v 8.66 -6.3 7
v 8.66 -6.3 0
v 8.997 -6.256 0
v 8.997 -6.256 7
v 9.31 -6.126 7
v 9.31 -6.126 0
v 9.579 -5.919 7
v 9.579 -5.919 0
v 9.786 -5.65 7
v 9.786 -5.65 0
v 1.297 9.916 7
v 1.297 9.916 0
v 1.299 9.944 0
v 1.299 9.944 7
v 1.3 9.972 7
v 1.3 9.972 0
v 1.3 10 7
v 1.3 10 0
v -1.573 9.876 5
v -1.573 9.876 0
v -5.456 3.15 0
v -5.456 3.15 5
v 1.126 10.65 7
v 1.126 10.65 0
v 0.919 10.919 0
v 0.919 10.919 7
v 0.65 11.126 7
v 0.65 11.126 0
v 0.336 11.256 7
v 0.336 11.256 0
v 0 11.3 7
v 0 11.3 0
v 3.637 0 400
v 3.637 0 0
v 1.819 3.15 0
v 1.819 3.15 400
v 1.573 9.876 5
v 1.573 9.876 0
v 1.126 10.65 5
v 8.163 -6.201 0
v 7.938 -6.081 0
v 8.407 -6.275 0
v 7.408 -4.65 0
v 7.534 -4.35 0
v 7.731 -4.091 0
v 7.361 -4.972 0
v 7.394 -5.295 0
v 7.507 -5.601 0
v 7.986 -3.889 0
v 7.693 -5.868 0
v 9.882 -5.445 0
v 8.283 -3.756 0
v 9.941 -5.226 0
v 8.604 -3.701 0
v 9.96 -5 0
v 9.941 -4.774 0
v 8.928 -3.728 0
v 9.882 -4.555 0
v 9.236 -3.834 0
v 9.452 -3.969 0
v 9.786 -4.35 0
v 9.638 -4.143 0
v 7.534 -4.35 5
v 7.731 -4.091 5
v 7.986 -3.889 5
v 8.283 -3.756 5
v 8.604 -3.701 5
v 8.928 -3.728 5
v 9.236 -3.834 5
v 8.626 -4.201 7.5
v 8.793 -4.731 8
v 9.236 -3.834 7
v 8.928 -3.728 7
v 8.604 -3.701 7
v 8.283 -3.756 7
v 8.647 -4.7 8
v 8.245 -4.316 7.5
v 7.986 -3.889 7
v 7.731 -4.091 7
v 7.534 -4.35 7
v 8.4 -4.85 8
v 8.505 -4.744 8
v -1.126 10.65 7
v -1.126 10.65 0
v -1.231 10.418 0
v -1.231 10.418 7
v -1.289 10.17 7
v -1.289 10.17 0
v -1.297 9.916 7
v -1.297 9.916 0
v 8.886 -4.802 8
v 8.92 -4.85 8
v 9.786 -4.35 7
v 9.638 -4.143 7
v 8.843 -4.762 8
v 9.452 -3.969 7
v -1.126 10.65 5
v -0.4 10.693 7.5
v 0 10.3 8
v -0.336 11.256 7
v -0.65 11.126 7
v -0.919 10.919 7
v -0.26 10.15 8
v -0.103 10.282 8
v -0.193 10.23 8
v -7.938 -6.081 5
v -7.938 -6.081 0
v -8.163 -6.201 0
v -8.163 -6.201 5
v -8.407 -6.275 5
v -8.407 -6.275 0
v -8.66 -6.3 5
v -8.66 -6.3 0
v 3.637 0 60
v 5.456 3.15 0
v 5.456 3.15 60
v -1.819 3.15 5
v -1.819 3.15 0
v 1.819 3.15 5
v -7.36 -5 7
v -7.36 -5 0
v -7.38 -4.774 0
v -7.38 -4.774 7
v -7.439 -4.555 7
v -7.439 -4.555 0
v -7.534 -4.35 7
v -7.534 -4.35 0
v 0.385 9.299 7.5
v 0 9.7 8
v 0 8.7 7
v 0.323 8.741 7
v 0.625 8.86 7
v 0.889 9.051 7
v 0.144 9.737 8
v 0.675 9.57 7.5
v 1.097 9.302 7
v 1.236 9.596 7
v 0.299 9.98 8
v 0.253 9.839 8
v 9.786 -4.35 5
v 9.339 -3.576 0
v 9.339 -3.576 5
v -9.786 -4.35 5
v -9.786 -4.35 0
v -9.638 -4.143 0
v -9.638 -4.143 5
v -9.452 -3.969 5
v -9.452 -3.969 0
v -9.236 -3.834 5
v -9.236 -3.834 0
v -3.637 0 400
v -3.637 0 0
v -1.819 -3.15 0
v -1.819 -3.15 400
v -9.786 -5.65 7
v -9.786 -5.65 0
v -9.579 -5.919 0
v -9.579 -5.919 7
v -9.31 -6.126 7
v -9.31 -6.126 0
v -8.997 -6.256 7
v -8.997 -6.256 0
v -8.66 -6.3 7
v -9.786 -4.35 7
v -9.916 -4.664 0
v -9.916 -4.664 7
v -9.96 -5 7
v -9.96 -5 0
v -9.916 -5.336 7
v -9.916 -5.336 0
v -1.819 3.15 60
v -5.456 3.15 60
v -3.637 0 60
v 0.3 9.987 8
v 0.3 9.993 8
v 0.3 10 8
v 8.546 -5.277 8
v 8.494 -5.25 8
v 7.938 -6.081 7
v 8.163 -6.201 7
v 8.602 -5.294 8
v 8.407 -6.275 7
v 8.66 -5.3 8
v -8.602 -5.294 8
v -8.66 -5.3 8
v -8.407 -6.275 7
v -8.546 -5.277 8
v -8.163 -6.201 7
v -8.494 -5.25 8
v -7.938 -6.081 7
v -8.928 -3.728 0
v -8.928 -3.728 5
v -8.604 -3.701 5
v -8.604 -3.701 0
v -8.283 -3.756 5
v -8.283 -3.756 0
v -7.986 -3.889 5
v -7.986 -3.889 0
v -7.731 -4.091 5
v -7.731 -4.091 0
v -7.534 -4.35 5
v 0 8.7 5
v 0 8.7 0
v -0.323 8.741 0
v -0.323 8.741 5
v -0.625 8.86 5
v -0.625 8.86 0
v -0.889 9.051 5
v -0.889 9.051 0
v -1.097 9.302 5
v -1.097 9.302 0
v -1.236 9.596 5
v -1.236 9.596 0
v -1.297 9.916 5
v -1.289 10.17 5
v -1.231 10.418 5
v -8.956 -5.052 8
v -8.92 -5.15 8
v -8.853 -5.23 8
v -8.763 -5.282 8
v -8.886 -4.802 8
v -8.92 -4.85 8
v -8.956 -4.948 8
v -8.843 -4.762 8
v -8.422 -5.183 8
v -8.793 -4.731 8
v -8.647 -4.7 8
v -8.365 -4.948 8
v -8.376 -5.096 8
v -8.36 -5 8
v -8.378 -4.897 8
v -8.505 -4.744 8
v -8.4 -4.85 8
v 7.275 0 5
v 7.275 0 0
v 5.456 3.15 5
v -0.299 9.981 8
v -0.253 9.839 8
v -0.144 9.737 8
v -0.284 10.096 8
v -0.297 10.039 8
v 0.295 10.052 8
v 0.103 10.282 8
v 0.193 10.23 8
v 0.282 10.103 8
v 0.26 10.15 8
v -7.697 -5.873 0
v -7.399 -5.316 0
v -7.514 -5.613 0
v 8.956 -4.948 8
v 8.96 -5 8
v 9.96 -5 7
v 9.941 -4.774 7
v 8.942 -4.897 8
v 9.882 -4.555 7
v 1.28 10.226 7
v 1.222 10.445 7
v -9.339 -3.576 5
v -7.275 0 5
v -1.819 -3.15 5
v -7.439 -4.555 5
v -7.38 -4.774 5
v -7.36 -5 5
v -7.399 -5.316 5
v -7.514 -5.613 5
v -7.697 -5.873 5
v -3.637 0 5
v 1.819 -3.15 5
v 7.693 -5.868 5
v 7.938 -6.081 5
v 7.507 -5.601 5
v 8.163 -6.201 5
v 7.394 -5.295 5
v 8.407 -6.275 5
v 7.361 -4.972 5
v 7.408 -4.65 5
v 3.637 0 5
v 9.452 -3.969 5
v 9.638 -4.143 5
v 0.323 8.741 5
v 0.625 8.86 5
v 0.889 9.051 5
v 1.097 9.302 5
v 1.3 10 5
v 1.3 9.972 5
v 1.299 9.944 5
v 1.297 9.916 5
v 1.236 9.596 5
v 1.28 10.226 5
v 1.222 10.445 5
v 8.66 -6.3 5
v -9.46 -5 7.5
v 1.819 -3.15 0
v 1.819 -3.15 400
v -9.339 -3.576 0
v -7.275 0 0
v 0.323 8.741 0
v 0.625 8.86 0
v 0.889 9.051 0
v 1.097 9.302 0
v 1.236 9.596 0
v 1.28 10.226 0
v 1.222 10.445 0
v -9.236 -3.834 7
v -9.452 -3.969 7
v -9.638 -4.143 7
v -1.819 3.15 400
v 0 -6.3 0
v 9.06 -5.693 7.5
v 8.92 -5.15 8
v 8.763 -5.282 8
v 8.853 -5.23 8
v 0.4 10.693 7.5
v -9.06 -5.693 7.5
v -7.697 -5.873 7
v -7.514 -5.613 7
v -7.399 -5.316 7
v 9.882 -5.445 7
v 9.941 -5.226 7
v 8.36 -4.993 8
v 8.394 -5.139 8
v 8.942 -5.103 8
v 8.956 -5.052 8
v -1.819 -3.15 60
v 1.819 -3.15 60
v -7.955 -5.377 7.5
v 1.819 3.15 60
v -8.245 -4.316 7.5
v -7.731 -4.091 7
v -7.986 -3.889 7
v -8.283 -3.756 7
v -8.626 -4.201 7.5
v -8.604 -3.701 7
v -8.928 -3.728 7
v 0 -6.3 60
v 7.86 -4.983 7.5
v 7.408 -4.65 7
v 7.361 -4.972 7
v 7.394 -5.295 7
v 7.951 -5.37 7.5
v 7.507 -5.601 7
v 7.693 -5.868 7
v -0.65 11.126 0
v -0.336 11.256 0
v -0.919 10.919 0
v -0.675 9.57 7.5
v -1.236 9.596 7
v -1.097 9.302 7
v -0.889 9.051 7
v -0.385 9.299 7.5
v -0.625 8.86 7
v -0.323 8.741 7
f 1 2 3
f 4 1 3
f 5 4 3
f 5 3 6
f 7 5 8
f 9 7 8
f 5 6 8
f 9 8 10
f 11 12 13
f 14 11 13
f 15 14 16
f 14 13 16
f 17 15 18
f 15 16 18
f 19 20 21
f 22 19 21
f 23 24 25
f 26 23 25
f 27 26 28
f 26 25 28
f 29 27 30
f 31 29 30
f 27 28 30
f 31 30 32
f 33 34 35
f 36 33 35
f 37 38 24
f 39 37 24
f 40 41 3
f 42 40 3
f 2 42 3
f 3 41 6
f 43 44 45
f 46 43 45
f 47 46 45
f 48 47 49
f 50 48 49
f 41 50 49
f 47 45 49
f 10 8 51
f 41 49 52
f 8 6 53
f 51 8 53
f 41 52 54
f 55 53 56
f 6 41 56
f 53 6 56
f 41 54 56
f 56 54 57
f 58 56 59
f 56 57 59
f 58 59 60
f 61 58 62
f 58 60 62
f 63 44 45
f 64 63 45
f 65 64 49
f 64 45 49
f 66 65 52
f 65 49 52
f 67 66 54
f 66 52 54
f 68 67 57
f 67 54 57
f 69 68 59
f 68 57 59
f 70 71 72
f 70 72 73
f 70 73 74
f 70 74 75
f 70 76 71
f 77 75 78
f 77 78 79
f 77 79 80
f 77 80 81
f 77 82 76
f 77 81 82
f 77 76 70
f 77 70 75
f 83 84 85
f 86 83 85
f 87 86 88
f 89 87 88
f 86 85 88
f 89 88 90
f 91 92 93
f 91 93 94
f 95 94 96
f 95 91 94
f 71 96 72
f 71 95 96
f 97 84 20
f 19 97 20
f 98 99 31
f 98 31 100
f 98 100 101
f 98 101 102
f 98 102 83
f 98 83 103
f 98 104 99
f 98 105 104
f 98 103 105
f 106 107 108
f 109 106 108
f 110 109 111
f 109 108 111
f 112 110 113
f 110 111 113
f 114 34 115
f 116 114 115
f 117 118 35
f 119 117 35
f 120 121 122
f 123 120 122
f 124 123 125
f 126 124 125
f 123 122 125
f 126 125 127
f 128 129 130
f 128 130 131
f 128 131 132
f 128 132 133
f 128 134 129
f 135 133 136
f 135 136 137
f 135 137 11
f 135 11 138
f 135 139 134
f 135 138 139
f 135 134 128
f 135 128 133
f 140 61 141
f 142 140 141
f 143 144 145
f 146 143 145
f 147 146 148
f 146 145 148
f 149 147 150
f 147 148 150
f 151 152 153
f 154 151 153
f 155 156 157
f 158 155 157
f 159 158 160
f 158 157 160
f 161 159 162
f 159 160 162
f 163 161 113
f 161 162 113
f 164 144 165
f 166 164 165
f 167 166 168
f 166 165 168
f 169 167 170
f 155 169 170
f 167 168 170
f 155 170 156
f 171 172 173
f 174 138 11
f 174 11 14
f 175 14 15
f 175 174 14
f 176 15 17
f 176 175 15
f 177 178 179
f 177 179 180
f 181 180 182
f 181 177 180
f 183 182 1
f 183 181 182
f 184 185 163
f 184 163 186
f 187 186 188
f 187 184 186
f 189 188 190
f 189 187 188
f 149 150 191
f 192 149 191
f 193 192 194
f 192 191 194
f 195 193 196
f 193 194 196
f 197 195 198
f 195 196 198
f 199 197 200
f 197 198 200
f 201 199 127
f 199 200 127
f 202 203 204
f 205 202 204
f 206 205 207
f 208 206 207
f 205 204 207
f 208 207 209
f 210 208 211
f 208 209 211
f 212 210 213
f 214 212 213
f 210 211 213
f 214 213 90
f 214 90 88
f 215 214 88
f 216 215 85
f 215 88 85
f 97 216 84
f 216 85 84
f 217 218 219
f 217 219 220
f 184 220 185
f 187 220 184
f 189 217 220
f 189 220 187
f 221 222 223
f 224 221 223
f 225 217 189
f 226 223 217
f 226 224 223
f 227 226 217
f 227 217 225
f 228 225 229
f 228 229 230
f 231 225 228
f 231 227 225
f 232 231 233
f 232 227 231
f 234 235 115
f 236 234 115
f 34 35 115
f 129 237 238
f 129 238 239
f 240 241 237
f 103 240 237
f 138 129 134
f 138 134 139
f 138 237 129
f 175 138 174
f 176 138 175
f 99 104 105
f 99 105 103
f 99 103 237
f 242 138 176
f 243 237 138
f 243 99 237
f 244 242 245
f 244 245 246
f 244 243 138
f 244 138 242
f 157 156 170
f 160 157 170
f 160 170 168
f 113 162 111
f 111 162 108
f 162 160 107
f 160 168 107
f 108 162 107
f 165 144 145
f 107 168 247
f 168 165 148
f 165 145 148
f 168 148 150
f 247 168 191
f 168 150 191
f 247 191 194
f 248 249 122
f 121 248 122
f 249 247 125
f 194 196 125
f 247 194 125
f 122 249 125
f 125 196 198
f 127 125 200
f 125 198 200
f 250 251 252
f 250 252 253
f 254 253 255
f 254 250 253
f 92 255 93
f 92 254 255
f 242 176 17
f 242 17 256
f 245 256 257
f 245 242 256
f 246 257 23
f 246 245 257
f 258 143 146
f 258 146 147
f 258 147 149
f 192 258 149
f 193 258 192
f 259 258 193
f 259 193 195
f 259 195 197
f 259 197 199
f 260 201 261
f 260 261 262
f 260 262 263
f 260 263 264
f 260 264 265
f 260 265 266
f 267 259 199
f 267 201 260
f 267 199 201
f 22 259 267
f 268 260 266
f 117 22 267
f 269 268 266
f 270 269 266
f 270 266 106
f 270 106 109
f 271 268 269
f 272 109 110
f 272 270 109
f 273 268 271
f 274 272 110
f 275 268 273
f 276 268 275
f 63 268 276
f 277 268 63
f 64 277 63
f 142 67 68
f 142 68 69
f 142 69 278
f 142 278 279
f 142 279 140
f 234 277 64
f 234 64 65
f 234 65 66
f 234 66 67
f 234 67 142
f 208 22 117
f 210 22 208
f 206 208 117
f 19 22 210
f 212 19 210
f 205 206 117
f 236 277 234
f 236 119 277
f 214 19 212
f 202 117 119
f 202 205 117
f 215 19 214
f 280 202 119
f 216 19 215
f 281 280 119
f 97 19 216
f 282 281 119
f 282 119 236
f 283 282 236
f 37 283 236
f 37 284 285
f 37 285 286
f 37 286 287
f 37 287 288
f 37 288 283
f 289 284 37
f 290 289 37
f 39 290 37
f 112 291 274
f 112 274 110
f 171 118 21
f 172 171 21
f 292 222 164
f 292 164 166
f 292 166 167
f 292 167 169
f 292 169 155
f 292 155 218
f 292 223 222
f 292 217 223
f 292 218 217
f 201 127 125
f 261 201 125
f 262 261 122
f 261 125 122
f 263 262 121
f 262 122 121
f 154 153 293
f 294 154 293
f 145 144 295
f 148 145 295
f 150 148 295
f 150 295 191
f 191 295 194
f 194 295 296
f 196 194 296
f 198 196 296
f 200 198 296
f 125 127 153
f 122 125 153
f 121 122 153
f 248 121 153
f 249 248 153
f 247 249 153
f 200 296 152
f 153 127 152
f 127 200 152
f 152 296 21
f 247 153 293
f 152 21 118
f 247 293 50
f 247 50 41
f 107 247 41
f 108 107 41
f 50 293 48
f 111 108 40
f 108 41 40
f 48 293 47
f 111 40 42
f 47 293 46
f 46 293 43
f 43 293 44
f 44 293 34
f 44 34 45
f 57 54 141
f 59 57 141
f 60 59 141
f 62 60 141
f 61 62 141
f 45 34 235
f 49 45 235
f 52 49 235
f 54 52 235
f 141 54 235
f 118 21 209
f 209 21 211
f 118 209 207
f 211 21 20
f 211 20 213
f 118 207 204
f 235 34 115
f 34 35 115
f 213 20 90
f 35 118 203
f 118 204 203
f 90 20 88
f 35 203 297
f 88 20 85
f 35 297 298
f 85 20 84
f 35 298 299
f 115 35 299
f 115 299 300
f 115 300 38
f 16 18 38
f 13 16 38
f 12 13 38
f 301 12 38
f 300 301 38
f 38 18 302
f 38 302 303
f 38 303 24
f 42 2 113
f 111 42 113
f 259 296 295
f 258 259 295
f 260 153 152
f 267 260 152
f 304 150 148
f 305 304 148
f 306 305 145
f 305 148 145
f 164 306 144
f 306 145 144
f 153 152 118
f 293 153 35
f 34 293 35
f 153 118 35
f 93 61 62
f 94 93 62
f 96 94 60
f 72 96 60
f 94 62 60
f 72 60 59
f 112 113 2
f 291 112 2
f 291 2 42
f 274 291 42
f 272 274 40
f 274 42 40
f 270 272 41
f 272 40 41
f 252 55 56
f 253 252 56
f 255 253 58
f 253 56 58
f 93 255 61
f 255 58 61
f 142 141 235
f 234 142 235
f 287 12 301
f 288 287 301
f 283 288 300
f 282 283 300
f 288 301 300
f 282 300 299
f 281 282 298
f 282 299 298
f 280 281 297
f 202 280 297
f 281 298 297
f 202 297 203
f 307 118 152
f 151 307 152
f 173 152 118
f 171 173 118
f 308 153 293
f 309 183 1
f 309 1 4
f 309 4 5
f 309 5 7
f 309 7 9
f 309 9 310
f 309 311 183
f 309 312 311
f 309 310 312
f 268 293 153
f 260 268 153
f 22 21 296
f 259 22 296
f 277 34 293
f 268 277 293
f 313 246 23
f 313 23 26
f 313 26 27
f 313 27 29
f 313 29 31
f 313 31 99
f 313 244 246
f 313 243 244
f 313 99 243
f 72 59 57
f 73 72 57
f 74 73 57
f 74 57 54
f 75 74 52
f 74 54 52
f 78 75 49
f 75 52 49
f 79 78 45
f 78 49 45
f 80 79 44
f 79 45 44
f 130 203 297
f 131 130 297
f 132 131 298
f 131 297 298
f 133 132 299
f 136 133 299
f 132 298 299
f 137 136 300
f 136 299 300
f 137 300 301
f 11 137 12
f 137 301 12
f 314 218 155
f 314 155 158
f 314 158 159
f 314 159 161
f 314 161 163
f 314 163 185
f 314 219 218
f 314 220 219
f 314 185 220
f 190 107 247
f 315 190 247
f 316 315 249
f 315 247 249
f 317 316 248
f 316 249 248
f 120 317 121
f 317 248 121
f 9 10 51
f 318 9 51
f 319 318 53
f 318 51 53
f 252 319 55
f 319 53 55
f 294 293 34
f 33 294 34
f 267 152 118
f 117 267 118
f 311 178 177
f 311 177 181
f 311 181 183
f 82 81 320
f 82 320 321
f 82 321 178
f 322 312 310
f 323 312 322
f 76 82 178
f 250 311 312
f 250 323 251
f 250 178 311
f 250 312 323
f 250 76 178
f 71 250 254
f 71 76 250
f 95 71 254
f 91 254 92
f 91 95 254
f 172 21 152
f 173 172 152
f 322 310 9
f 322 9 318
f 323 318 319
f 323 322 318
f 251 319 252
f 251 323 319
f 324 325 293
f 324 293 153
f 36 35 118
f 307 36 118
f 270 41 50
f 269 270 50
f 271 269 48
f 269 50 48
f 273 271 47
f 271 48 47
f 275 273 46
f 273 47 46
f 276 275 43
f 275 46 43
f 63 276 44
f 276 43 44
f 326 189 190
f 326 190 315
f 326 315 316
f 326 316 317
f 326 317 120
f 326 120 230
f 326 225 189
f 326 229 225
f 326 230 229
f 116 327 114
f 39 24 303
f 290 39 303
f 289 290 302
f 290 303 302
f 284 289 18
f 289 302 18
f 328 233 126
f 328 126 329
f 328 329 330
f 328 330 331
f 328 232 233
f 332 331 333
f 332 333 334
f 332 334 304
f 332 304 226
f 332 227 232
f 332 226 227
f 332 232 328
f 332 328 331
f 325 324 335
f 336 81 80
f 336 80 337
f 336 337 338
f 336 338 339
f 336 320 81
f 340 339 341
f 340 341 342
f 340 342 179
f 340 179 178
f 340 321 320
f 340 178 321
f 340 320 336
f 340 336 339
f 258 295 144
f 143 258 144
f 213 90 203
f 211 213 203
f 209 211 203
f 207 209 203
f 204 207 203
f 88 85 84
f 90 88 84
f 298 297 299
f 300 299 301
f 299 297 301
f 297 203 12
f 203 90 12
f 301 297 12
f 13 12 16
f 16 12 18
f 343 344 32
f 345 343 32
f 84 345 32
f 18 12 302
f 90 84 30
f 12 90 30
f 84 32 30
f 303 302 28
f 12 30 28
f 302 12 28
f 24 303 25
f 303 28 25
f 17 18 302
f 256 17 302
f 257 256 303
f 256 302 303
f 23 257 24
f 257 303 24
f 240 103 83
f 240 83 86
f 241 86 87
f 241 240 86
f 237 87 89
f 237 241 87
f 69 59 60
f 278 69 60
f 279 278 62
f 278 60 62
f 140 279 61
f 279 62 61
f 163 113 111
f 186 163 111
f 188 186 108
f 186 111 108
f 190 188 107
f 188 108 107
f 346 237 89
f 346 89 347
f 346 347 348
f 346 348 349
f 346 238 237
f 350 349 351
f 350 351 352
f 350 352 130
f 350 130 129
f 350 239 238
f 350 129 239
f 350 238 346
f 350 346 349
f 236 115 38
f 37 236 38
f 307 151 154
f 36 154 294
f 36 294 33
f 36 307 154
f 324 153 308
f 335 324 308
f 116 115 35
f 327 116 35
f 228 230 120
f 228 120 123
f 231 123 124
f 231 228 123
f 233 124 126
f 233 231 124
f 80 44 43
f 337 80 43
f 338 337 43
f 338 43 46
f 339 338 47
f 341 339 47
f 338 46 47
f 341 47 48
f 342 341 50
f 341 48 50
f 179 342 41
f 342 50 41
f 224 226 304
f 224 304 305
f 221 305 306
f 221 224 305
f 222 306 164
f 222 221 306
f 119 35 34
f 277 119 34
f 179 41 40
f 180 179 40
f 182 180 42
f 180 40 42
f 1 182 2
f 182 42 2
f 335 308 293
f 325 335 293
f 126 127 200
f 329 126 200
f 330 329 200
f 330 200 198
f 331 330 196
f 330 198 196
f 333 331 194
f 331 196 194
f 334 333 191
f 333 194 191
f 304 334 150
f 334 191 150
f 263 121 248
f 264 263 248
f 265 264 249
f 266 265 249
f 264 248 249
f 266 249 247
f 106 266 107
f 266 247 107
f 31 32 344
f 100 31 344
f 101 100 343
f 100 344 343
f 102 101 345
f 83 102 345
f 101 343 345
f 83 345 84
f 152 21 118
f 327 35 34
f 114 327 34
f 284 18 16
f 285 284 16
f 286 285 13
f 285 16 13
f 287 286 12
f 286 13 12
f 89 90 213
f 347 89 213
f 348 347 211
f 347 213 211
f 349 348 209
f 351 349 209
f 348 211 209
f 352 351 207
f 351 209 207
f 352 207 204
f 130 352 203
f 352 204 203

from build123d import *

# Parameters (mm, degrees)
F1_DEPTH  = 5
F2_DEPTH  = 60
F3_DEPTH  = 400
F4_DEPTH  = 8
F5_SIZE   = 1
F5_2_SIZE = 1
F5_3_SIZE = 1


with BuildPart() as f1:
    # F0 (on Top) → F1 (new body)
    with BuildSketch(Plane.XY):
        with BuildLine():
            ThreePointArc((-1.2972508431, 9.9155), (-1.435256889, 9.8964659178), (-1.5729843808, 9.875511133))
            Line((-1.5729843808, 9.875511133), (-5.4559600438, 3.15))
            Line((-5.4559600438, 3.15), (-1.8186533479, 3.15))
            Line((-1.8186533479, 3.15), (0, 6.3))
            Line((0, 6.3), (0, 8.7))
            ThreePointArc((0, 8.7), (-0.8888616315, 9.0513562312), (-1.2972508431, 9.9155))
        make_face()
        with BuildLine():
            ThreePointArc((1.2972508431, 9.9155), (0.8888616315, 9.0513562312), (0, 8.7))
            Line((0, 8.7), (0, 6.3))
            Line((0, 6.3), (1.8186533479, 3.15))
            Line((1.8186533479, 3.15), (5.4559600438, 3.15))
            Line((5.4559600438, 3.15), (1.5729843808, 9.875511133))
            ThreePointArc((1.5729843808, 9.875511133), (1.435256889, 9.8964659178), (1.2972508431, 9.9155))
        make_face()
        Polygon((-5.4559600438, 3.15), (-7.2746133918, 0), (-3.6373066959, 0), align=None)
        with BuildLine():
            Line((-3.6373066959, 0), (-7.2746133918, 0))
            Line((-7.2746133918, 0), (-9.3389357069, -3.575511133))
            ThreePointArc((-9.3389357069, -3.575511133), (-9.288219337, -3.7052640321), (-9.2357003128, -3.8342978148))
            ThreePointArc((-9.2357003128, -3.8342978148), (-8.2831352507, -3.7559013623), (-7.5344210129, -4.35))
            Line((-7.5344210129, -4.35), (-5.4559600438, -3.15))
            Line((-5.4559600438, -3.15), (-3.6373066959, 0))
        make_face()
        with BuildLine():
            Line((-1.8186533479, -3.15), (-5.4559600438, -3.15))
            Line((-5.4559600438, -3.15), (-7.5344210129, -4.35))
            ThreePointArc((-7.5344210129, -4.35), (-7.4045504637, -4.6635352414), (-7.3602540378, -5))
            ThreePointArc((-7.3602540378, -5), (-7.513880203, -5.6130473315), (-7.9384494697, -6.0812021852))
            ThreePointArc((-7.9384494697, -6.0812021852), (-7.852962448, -6.1912018858), (-7.7659513261, -6.3))
            Line((-7.7659513261, -6.3), (0, -6.3))
            Line((0, -6.3), (-1.8186533479, -3.15))
        make_face()
        with BuildLine():
            Line((1.8186533479, -3.15), (0, -6.3))
            Line((0, -6.3), (7.7659513261, -6.3))
            ThreePointArc((7.7659513261, -6.3), (7.852962448, -6.1912018858), (7.9384494697, -6.0812021852))
            ThreePointArc((7.9384494697, -6.0812021852), (7.3942736192, -5.295454869), (7.5344210129, -4.35))
            Line((7.5344210129, -4.35), (5.4559600438, -3.15))
            Line((5.4559600438, -3.15), (1.8186533479, -3.15))
        make_face()
        with BuildLine():
            Line((3.6373066959, 0), (5.4559600438, -3.15))
            Line((5.4559600438, -3.15), (7.5344210129, -4.35))
            ThreePointArc((7.5344210129, -4.35), (8.2831352507, -3.7559013623), (9.2357003128, -3.8342978148))
            ThreePointArc((9.2357003128, -3.8342978148), (9.288219337, -3.7052640321), (9.3389357069, -3.575511133))
            Line((9.3389357069, -3.575511133), (7.2746133918, 0))
            Line((7.2746133918, 0), (3.6373066959, 0))
        make_face()
        Polygon((5.4559600438, 3.15), (3.6373066959, 0), (7.2746133918, 0), align=None)
        Polygon((-5.4559600438, 3.15), (-3.6373066959, 0), (-1.8186533479, 3.15), align=None)
        Polygon((1.8186533479, -3.15), (-1.8186533479, -3.15), (0, -6.3), align=None)
        Polygon((5.4559600438, 3.15), (1.8186533479, 3.15), (3.6373066959, 0), align=None)
        with BuildLine():
            Line((1.5729843808, 9.875511133), (1.125833032, 10.6499999878))
            ThreePointArc((1.125833032, 10.6499999878), (1.255703576, 10.3364647518), (1.3, 10))
            ThreePointArc((1.3, 10), (1.299312529, 9.9577276454), (1.2972508431, 9.9155))
            ThreePointArc((1.2972508431, 9.9155), (1.435256889, 9.8964659178), (1.5729843808, 9.875511133))
        make_face()
        with BuildLine():
            Line((-1.1258330062, 10.6500000324), (-1.5729843808, 9.875511133))
            ThreePointArc((-1.5729843808, 9.875511133), (-1.435256889, 9.8964659178), (-1.2972508431, 9.9155))
            ThreePointArc((-1.2972508431, 9.9155), (-1.2659804144, 10.2954548872), (-1.1258330062, 10.6500000324))
        make_face()
        with BuildLine():
            ThreePointArc((-9.2357003128, -3.8342978148), (-9.288219337, -3.7052640321), (-9.3389357069, -3.575511133))
            Line((-9.3389357069, -3.575511133), (-9.7860870951, -4.3500000559))
            ThreePointArc((-9.7860870951, -4.3500000559), (-9.5491156929, -4.0513562533), (-9.2357003128, -3.8342978148))
        make_face()
        with BuildLine():
            ThreePointArc((-7.9384494697, -6.0812021852), (-8.2831352461, -6.2440986363), (-8.6602540282, -6.3))
            Line((-8.6602540282, -6.3), (-7.7659513261, -6.3))
            ThreePointArc((-7.7659513261, -6.3), (-7.852962448, -6.1912018858), (-7.9384494697, -6.0812021852))
        make_face()
        with BuildLine():
            ThreePointArc((9.3389357069, -3.575511133), (9.288219337, -3.7052640321), (9.2357003128, -3.8342978148))
            ThreePointArc((9.2357003128, -3.8342978148), (9.5491156757, -4.0513562371), (9.7860870714, -4.3500000149))
            Line((9.7860870714, -4.3500000149), (9.3389357069, -3.575511133))
        make_face()
        with BuildLine():
            ThreePointArc((7.9384494697, -6.0812021852), (7.852962448, -6.1912018858), (7.7659513261, -6.3))
            Line((7.7659513261, -6.3), (8.6602540378, -6.3))
            ThreePointArc((8.6602540378, -6.3), (8.2831352507, -6.2440986377), (7.9384494697, -6.0812021852))
        make_face()
        Polygon((3.6373066959, 0), (2.7279800219, -1.575), (5.4559600438, -3.15), align=None)
        Polygon((5.4559600438, -3.15), (2.7279800219, -1.575), (1.8186533479, -3.15), align=None)
        Polygon((-2.7279800219, -1.575), (-3.6373066959, 0), (-5.4559600438, -3.15), align=None)
        Polygon((-1.8186533479, -3.15), (-2.7279800219, -1.575), (-5.4559600438, -3.15), align=None)
        Polygon((0, 6.3), (-1.8186533479, 3.15), (0, 3.15), align=None)
        Polygon((0, 6.3), (0, 3.15), (1.8186533479, 3.15), align=None)
    extrude(amount=F1_DEPTH)


with BuildPart() as f2:
    # F0 (on Top) → F2 (new body)
    with BuildSketch(Plane.XY):
        Polygon((-5.4559600438, 3.15), (-3.6373066959, 0), (-1.8186533479, 3.15), align=None)
    extrude(amount=F2_DEPTH)


with BuildPart() as f2b:
    # F0 (on Top) → F2, piece 2 (new body)
    with BuildSketch(Plane.XY):
        Polygon((1.8186533479, -3.15), (-1.8186533479, -3.15), (0, -6.3), align=None)
    extrude(amount=F2_DEPTH)


with BuildPart() as f2c:
    # F0 (on Top) → F2, piece 3 (new body)
    with BuildSketch(Plane.XY):
        Polygon((5.4559600438, 3.15), (1.8186533479, 3.15), (3.6373066959, 0), align=None)
    extrude(amount=F2_DEPTH)


with BuildPart() as f3:
    # F0 (on Top) → F3 (new body)
    with BuildSketch(Plane.XY):
        Polygon((1.8186533479, 3.15), (0, 3.15), (1.8186533479, 0), (3.6373066959, 0), align=None)
        Polygon((-1.8186533479, 3.15), (-3.6373066959, 0), (-1.8186533479, 0), (0, 3.15), align=None)
        Polygon((-1.8186533479, 0), (-3.6373066959, 0), (-2.7279800219, -1.575), align=None)
        Polygon((2.7279800219, -1.575), (-2.7279800219, -1.575), (-1.8186533479, -3.15), (1.8186533479, -3.15), align=None)
        Polygon((1.8186533479, 0), (2.7279800219, -1.575), (3.6373066959, 0), align=None)
        Polygon((1.8186533479, 0), (0, 0), (2.7279800219, -1.575), align=None)
        Polygon((0, 0), (-2.7279800219, -1.575), (2.7279800219, -1.575), align=None)
        Polygon((0, 0), (-1.8186533479, 0), (-2.7279800219, -1.575), align=None)
        Polygon((0, 3.15), (-1.8186533479, 0), (0, 0), align=None)
        Polygon((0, 3.15), (0, 0), (1.8186533479, 0), align=None)
    extrude(amount=F3_DEPTH)


with BuildPart() as f4:
    # F0 (on Top) → F4 (new body)
    with BuildSketch(Plane.XY):
        with BuildLine():
            ThreePointArc((0, 11.3), (-0.6499999838, 11.1258330343), (-1.1258330062, 10.6500000324))
            ThreePointArc((-1.1258330062, 10.6500000324), (-1.2659804144, 10.2954548872), (-1.2972508431, 9.9155))
            ThreePointArc((-1.2972508431, 9.9155), (-0.65, 9.9788526395), (0, 10))
            Line((0, 10), (0, 11.3))
        make_face()
        with BuildLine():
            ThreePointArc((0, 10), (-0.65, 9.9788526395), (-1.2972508431, 9.9155))
            ThreePointArc((-1.2972508431, 9.9155), (-0.8888616315, 9.0513562312), (0, 8.7))
            Line((0, 8.7), (0, 10))
        make_face()
        with BuildLine():
            ThreePointArc((1.2972508431, 9.9155), (0.65, 9.9788526395), (0, 10))
            Line((0, 10), (0, 8.7))
            ThreePointArc((0, 8.7), (0.8888616315, 9.0513562312), (1.2972508431, 9.9155))
        make_face()
        with BuildLine():
            ThreePointArc((1.125833032, 10.6499999878), (0.6500000061, 11.1258330214), (0, 11.3))
            Line((0, 11.3), (0, 10))
            ThreePointArc((0, 10), (0.65, 9.9788526395), (1.2972508431, 9.9155))
            ThreePointArc((1.2972508431, 9.9155), (1.299312529, 9.9577276454), (1.3, 10))
            ThreePointArc((1.3, 10), (1.255703576, 10.3364647518), (1.125833032, 10.6499999878))
        make_face()
    extrude(amount=F4_DEPTH)

    # F5#3
    f5_3_edges = [f4.edges().sort_by_distance(p)[0] for p in [
        (-1.297251, 10.0845, 8),
    ]]
    chamfer(f5_3_edges, length=F5_3_SIZE)


with BuildPart() as f4b:
    # F0 (on Top) → F4, piece 2 (new body)
    with BuildSketch(Plane.XY):
        with BuildLine():
            ThreePointArc((-9.2357003128, -3.8342978148), (-9.5491156929, -4.0513562533), (-9.7860870951, -4.3500000559))
            ThreePointArc((-9.7860870951, -4.3500000559), (-9.9602540378, -5.0000000323), (-9.7860870628, -5.65))
            Line((-9.7860870628, -5.65), (-8.6602540378, -5))
            ThreePointArc((-8.6602540378, -5), (-8.9669398864, -4.4265098073), (-9.2357003128, -3.8342978148))
        make_face()
        with BuildLine():
            Line((-8.6602540378, -5), (-9.7860870628, -5.65))
            ThreePointArc((-9.7860870628, -5.65), (-9.3102540337, -6.1258330273), (-8.6602540282, -6.3))
            ThreePointArc((-8.6602540282, -6.3), (-8.2831352461, -6.2440986363), (-7.9384494697, -6.0812021852))
            ThreePointArc((-7.9384494697, -6.0812021852), (-8.3169398864, -5.5523428322), (-8.6602540378, -5))
        make_face()
        with BuildLine():
            Line((-7.5344210129, -4.35), (-8.6602540378, -5))
            ThreePointArc((-8.6602540378, -5), (-8.3169398864, -5.5523428322), (-7.9384494697, -6.0812021852))
            ThreePointArc((-7.9384494697, -6.0812021852), (-7.513880203, -5.6130473315), (-7.3602540378, -5))
            ThreePointArc((-7.3602540378, -5), (-7.4045504637, -4.6635352414), (-7.5344210129, -4.35))
        make_face()
        with BuildLine():
            ThreePointArc((-7.5344210129, -4.35), (-8.2831352507, -3.7559013623), (-9.2357003128, -3.8342978148))
            ThreePointArc((-9.2357003128, -3.8342978148), (-8.9669398864, -4.4265098073), (-8.6602540378, -5))
            Line((-8.6602540378, -5), (-7.5344210129, -4.35))
        make_face()
    extrude(amount=F4_DEPTH)

    # F5
    f5_edges = [f4b.edges().sort_by_distance(p)[0] for p in [
        (-9.786087, -5.65, 8),
    ]]
    chamfer(f5_edges, length=F5_SIZE)


with BuildPart() as f4c:
    # F0 (on Top) → F4, piece 3 (new body)
    with BuildSketch(Plane.XY):
        with BuildLine():
            Line((8.6602540378, -5), (7.5344210129, -4.35))
            ThreePointArc((7.5344210129, -4.35), (7.3942736192, -5.295454869), (7.9384494697, -6.0812021852))
            ThreePointArc((7.9384494697, -6.0812021852), (8.3169398864, -5.5523428322), (8.6602540378, -5))
        make_face()
        with BuildLine():
            ThreePointArc((9.2357003128, -3.8342978148), (8.2831352507, -3.7559013623), (7.5344210129, -4.35))
            Line((7.5344210129, -4.35), (8.6602540378, -5))
            ThreePointArc((8.6602540378, -5), (8.9669398864, -4.4265098073), (9.2357003128, -3.8342978148))
        make_face()
        with BuildLine():
            ThreePointArc((9.2357003128, -3.8342978148), (8.9669398864, -4.4265098073), (8.6602540378, -5))
            Line((8.6602540378, -5), (9.7860870628, -5.65))
            ThreePointArc((9.7860870628, -5.65), (9.915957612, -5.3364647586), (9.9602540378, -5))
            ThreePointArc((9.9602540378, -5), (9.9159576142, -4.6635352497), (9.7860870714, -4.3500000149))
            ThreePointArc((9.7860870714, -4.3500000149), (9.5491156757, -4.0513562371), (9.2357003128, -3.8342978148))
        make_face()
        with BuildLine():
            ThreePointArc((7.9384494697, -6.0812021852), (8.2831352507, -6.2440986377), (8.6602540378, -6.3))
            ThreePointArc((8.6602540378, -6.3), (9.3102540378, -6.1258330249), (9.7860870628, -5.65))
            Line((9.7860870628, -5.65), (8.6602540378, -5))
            ThreePointArc((8.6602540378, -5), (8.3169398864, -5.5523428322), (7.9384494697, -6.0812021852))
        make_face()
    extrude(amount=F4_DEPTH)

    # F5#2
    f5_2_edges = [f4c.edges().sort_by_distance(p)[0] for p in [
        (9.382059, -3.918798, 8),
    ]]
    chamfer(f5_2_edges, length=F5_2_SIZE)


solid = Compound([f1.part, f2.part, f2b.part, f2c.part, f3.part, f4.part, f4b.part, f4c.part])
